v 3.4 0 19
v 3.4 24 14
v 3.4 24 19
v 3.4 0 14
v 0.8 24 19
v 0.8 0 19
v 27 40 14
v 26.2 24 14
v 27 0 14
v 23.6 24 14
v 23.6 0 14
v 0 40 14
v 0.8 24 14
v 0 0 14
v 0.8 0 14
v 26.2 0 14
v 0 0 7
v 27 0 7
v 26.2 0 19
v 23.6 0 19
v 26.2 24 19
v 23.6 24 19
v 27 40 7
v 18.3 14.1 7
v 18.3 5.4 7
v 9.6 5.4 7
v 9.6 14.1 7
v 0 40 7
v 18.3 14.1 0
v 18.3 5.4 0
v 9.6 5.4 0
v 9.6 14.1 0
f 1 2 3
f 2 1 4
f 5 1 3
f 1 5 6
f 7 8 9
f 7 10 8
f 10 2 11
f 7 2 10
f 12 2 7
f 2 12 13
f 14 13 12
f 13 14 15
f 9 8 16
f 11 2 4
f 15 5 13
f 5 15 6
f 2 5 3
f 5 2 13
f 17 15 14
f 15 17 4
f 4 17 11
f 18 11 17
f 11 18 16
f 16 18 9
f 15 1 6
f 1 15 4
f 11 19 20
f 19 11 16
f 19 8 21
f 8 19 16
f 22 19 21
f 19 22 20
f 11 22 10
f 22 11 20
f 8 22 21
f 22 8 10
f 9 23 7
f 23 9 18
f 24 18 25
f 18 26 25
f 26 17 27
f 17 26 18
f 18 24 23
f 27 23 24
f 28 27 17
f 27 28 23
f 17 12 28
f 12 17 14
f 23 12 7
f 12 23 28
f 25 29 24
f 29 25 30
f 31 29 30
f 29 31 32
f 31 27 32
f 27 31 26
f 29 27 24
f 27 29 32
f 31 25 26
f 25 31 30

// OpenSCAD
esp_height=19;
esp_width=27;
esp_length=40;
esp_upper_pin_height=5;
esp_upper_pin_length=24;
esp_upper_pin_width=2.6;
esp_upper_pin_margin_x=0.8;
esp_upper_pin_margin_y=3.4;
esp_middle_height=7;
esp_camara_margin_y=5.4;
esp_camara_margin_x=9.6;
esp_camara_width=8.7;
esp_camara_length=8.7;


module esp_mock(){

    // pin rows
    translate([esp_upper_pin_margin_x, 0, esp_height - esp_upper_pin_height])
    cube([esp_upper_pin_width, esp_upper_pin_length, esp_upper_pin_height]);
    translate([esp_width - esp_upper_pin_width - esp_upper_pin_margin_x, 0, esp_height - esp_upper_pin_height])
    cube([esp_upper_pin_width, esp_upper_pin_length, esp_upper_pin_height]);

    // main body
    translate([0,0,esp_height - esp_upper_pin_height - esp_middle_height])
    cube([esp_width,esp_length,esp_middle_height]);

    // camera
    translate([esp_camara_margin_x,esp_camara_margin_y,0])
    cube([esp_camara_width,esp_camara_length,esp_height - esp_upper_pin_height - esp_middle_height]);
}


/*
module base_body(){
    difference(){
        cube([
            screw_extension_width*2 + wall_strength*2 + base_width,
            base_depth,
            base_height + wall_strength*2
        ]);
        
        translate([screw_extension_width + wall_strength, 0, wall_strength]) cube([base_width, base_depth, base_height+wall_strength]);
        cube([screw_extension_width, base_depth, base_height+wall_strength]);
        translate([screw_extension_width + wall_strength*2 + base_width, 0, 0]) cube([screw_extension_width, base_depth, base_height+wall_strength]);
    }
}
*/

esp_mock();
